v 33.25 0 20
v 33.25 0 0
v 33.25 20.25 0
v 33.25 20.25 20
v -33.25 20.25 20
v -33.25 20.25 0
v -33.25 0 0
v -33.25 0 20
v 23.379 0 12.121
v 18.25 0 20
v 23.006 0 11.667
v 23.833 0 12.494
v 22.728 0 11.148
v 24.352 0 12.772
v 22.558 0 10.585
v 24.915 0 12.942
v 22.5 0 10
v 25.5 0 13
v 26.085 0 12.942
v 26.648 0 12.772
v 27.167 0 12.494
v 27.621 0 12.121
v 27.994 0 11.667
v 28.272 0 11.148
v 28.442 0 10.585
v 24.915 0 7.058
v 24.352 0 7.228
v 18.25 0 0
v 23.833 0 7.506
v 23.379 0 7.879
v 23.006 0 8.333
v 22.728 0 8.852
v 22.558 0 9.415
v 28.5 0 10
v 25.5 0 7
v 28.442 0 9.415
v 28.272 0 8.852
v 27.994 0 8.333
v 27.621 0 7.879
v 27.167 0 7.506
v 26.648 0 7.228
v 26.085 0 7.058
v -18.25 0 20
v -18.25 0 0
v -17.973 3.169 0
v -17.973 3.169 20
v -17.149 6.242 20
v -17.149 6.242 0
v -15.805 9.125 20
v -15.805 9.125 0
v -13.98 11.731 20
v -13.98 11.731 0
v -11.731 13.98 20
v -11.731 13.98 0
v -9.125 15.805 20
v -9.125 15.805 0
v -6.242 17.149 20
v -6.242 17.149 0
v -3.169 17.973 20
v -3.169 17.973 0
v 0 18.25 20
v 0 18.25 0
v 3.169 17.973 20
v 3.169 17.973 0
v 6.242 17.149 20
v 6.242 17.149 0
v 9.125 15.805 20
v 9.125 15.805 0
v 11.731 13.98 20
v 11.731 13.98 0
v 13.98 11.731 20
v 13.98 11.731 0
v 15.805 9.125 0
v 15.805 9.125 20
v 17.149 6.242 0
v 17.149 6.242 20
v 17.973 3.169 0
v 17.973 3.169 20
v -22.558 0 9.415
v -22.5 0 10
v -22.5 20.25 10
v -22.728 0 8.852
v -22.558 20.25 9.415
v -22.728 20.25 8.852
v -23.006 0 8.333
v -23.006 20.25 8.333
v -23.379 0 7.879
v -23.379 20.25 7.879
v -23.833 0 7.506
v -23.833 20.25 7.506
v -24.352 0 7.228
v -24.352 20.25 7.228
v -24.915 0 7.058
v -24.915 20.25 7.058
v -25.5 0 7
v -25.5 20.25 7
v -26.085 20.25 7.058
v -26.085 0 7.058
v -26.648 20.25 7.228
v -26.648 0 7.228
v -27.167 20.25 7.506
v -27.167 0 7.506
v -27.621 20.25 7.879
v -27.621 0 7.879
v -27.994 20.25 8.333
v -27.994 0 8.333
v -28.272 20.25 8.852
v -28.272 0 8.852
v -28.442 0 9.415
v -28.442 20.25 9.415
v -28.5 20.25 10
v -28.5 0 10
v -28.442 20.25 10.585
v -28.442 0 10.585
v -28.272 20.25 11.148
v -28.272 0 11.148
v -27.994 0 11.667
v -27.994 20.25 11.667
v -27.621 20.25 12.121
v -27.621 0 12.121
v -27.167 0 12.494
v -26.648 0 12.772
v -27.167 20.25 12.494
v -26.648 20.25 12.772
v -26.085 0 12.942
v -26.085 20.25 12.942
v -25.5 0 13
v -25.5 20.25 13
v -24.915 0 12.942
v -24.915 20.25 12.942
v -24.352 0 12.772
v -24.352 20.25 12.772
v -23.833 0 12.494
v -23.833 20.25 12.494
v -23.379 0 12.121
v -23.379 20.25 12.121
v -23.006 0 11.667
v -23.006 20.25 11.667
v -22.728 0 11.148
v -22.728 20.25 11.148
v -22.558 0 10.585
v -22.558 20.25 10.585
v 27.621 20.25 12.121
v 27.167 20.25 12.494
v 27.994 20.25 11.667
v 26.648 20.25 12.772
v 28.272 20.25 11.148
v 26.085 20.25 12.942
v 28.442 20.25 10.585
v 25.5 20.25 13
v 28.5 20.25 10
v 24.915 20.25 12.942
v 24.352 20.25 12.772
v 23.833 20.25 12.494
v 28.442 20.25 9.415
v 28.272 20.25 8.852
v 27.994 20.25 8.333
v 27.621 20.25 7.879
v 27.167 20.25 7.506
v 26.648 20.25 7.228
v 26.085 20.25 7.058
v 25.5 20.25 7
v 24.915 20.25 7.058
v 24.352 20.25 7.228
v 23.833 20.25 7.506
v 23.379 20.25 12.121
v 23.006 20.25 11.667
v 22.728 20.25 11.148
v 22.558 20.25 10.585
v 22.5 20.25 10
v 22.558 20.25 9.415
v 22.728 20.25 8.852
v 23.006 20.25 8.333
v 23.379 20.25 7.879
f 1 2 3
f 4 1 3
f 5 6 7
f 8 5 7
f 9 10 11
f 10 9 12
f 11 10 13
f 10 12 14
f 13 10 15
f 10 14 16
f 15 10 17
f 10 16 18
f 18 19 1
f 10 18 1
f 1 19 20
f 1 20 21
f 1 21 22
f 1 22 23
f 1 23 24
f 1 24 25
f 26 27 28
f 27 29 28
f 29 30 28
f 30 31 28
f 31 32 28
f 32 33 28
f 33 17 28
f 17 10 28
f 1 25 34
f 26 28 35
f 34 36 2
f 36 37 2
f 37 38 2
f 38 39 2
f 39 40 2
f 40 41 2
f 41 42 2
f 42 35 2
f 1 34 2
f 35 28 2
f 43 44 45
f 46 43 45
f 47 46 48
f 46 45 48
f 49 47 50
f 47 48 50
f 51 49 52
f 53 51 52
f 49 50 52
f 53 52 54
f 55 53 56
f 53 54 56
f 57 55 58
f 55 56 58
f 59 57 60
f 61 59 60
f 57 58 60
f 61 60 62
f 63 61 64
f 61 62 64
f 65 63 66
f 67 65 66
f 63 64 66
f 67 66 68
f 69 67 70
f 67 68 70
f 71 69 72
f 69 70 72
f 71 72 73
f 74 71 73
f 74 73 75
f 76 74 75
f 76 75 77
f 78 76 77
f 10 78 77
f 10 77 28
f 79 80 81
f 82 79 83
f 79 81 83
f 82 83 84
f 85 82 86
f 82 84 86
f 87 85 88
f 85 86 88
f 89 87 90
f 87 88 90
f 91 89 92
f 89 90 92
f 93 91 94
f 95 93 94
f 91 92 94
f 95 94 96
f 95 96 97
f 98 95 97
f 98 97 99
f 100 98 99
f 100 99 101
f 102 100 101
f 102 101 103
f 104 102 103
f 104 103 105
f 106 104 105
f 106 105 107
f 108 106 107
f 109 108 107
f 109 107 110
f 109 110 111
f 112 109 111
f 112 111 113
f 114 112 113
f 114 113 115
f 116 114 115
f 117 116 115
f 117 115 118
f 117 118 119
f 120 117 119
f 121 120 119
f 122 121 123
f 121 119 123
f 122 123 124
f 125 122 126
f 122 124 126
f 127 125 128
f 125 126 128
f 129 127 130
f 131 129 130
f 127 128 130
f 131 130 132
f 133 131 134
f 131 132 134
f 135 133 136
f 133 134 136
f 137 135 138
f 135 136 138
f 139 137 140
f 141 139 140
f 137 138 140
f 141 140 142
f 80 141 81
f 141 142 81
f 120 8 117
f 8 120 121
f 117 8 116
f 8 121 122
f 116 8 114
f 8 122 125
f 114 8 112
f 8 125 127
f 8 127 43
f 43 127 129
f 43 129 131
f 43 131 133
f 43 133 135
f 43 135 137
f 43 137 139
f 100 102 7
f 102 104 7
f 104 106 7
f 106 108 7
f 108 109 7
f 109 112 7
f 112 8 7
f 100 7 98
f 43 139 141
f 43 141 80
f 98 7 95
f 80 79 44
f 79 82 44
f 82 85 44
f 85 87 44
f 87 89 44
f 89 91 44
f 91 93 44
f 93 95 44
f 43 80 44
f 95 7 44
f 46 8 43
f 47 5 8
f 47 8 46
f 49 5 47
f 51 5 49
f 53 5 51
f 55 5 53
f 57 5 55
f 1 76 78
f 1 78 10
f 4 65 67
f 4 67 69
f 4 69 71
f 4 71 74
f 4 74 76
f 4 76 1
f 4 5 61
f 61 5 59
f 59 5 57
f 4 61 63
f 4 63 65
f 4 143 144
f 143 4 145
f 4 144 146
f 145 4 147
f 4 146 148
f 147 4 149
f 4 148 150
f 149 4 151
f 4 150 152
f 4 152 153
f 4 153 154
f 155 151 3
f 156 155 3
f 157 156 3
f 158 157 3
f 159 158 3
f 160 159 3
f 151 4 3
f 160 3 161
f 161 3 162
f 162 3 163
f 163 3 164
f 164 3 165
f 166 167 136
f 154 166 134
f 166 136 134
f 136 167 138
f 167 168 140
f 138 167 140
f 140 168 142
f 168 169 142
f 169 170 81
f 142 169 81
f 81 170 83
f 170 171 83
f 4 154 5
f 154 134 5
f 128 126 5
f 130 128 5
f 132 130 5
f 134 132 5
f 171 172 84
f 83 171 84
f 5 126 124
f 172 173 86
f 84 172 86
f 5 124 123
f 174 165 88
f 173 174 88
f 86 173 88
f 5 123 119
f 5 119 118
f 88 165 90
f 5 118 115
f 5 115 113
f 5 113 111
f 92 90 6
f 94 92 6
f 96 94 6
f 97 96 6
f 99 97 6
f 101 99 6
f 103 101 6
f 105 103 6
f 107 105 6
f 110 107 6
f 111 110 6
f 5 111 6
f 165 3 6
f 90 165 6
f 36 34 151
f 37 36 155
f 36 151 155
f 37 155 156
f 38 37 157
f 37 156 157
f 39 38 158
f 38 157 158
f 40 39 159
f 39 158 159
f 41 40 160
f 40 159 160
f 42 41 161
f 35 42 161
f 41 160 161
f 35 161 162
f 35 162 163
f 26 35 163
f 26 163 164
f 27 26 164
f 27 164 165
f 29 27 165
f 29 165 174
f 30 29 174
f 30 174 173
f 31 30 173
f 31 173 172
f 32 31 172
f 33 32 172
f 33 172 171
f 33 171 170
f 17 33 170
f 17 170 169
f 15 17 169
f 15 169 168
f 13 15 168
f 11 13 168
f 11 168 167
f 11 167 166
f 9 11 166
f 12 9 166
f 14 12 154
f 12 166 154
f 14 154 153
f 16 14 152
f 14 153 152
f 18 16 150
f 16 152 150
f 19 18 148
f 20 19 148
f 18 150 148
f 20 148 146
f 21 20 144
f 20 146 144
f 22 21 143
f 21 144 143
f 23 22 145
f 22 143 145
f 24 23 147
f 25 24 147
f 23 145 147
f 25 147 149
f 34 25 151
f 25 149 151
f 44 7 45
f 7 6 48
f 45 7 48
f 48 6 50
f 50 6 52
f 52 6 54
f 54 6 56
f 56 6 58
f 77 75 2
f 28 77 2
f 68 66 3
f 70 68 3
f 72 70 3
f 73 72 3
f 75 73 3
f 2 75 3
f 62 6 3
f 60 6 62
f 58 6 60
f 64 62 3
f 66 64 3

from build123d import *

# Parameters (mm, degrees)
EXTRUDE_1_DEPTH     = 20
SKETCH_2_R          = 3
CUT_EXTRUDE_1_DEPTH = 21.25


with BuildPart() as part:
    # 草图1 → 凸台-拉伸1 (new body)
    with BuildSketch(Plane.XY):
        with BuildLine():
            Line((-33.25, 0), (-18.25, 0))
            ThreePointArc((-18.25, 0), (0, 18.25), (18.25, 0))
            Line((18.25, 0), (33.25, 0))
            Line((33.25, 0), (33.25, 20.25))
            Line((33.25, 20.25), (-33.25, 20.25))
            Line((-33.25, 20.25), (-33.25, 0))
        make_face()
    extrude(amount=EXTRUDE_1_DEPTH)

    # 草图2 → 切除-拉伸1 (cut, through all)
    with BuildSketch(Plane(origin=(0, 20.25, 0), x_dir=(1, 0, 0), z_dir=(0, 1, 0))):
        with Locations((-25.5, -10)):
            Circle(SKETCH_2_R)
        with Locations((25.5, -10)):
            Circle(SKETCH_2_R)
    extrude(amount=-CUT_EXTRUDE_1_DEPTH, mode=Mode.SUBTRACT)


solid = part.part
